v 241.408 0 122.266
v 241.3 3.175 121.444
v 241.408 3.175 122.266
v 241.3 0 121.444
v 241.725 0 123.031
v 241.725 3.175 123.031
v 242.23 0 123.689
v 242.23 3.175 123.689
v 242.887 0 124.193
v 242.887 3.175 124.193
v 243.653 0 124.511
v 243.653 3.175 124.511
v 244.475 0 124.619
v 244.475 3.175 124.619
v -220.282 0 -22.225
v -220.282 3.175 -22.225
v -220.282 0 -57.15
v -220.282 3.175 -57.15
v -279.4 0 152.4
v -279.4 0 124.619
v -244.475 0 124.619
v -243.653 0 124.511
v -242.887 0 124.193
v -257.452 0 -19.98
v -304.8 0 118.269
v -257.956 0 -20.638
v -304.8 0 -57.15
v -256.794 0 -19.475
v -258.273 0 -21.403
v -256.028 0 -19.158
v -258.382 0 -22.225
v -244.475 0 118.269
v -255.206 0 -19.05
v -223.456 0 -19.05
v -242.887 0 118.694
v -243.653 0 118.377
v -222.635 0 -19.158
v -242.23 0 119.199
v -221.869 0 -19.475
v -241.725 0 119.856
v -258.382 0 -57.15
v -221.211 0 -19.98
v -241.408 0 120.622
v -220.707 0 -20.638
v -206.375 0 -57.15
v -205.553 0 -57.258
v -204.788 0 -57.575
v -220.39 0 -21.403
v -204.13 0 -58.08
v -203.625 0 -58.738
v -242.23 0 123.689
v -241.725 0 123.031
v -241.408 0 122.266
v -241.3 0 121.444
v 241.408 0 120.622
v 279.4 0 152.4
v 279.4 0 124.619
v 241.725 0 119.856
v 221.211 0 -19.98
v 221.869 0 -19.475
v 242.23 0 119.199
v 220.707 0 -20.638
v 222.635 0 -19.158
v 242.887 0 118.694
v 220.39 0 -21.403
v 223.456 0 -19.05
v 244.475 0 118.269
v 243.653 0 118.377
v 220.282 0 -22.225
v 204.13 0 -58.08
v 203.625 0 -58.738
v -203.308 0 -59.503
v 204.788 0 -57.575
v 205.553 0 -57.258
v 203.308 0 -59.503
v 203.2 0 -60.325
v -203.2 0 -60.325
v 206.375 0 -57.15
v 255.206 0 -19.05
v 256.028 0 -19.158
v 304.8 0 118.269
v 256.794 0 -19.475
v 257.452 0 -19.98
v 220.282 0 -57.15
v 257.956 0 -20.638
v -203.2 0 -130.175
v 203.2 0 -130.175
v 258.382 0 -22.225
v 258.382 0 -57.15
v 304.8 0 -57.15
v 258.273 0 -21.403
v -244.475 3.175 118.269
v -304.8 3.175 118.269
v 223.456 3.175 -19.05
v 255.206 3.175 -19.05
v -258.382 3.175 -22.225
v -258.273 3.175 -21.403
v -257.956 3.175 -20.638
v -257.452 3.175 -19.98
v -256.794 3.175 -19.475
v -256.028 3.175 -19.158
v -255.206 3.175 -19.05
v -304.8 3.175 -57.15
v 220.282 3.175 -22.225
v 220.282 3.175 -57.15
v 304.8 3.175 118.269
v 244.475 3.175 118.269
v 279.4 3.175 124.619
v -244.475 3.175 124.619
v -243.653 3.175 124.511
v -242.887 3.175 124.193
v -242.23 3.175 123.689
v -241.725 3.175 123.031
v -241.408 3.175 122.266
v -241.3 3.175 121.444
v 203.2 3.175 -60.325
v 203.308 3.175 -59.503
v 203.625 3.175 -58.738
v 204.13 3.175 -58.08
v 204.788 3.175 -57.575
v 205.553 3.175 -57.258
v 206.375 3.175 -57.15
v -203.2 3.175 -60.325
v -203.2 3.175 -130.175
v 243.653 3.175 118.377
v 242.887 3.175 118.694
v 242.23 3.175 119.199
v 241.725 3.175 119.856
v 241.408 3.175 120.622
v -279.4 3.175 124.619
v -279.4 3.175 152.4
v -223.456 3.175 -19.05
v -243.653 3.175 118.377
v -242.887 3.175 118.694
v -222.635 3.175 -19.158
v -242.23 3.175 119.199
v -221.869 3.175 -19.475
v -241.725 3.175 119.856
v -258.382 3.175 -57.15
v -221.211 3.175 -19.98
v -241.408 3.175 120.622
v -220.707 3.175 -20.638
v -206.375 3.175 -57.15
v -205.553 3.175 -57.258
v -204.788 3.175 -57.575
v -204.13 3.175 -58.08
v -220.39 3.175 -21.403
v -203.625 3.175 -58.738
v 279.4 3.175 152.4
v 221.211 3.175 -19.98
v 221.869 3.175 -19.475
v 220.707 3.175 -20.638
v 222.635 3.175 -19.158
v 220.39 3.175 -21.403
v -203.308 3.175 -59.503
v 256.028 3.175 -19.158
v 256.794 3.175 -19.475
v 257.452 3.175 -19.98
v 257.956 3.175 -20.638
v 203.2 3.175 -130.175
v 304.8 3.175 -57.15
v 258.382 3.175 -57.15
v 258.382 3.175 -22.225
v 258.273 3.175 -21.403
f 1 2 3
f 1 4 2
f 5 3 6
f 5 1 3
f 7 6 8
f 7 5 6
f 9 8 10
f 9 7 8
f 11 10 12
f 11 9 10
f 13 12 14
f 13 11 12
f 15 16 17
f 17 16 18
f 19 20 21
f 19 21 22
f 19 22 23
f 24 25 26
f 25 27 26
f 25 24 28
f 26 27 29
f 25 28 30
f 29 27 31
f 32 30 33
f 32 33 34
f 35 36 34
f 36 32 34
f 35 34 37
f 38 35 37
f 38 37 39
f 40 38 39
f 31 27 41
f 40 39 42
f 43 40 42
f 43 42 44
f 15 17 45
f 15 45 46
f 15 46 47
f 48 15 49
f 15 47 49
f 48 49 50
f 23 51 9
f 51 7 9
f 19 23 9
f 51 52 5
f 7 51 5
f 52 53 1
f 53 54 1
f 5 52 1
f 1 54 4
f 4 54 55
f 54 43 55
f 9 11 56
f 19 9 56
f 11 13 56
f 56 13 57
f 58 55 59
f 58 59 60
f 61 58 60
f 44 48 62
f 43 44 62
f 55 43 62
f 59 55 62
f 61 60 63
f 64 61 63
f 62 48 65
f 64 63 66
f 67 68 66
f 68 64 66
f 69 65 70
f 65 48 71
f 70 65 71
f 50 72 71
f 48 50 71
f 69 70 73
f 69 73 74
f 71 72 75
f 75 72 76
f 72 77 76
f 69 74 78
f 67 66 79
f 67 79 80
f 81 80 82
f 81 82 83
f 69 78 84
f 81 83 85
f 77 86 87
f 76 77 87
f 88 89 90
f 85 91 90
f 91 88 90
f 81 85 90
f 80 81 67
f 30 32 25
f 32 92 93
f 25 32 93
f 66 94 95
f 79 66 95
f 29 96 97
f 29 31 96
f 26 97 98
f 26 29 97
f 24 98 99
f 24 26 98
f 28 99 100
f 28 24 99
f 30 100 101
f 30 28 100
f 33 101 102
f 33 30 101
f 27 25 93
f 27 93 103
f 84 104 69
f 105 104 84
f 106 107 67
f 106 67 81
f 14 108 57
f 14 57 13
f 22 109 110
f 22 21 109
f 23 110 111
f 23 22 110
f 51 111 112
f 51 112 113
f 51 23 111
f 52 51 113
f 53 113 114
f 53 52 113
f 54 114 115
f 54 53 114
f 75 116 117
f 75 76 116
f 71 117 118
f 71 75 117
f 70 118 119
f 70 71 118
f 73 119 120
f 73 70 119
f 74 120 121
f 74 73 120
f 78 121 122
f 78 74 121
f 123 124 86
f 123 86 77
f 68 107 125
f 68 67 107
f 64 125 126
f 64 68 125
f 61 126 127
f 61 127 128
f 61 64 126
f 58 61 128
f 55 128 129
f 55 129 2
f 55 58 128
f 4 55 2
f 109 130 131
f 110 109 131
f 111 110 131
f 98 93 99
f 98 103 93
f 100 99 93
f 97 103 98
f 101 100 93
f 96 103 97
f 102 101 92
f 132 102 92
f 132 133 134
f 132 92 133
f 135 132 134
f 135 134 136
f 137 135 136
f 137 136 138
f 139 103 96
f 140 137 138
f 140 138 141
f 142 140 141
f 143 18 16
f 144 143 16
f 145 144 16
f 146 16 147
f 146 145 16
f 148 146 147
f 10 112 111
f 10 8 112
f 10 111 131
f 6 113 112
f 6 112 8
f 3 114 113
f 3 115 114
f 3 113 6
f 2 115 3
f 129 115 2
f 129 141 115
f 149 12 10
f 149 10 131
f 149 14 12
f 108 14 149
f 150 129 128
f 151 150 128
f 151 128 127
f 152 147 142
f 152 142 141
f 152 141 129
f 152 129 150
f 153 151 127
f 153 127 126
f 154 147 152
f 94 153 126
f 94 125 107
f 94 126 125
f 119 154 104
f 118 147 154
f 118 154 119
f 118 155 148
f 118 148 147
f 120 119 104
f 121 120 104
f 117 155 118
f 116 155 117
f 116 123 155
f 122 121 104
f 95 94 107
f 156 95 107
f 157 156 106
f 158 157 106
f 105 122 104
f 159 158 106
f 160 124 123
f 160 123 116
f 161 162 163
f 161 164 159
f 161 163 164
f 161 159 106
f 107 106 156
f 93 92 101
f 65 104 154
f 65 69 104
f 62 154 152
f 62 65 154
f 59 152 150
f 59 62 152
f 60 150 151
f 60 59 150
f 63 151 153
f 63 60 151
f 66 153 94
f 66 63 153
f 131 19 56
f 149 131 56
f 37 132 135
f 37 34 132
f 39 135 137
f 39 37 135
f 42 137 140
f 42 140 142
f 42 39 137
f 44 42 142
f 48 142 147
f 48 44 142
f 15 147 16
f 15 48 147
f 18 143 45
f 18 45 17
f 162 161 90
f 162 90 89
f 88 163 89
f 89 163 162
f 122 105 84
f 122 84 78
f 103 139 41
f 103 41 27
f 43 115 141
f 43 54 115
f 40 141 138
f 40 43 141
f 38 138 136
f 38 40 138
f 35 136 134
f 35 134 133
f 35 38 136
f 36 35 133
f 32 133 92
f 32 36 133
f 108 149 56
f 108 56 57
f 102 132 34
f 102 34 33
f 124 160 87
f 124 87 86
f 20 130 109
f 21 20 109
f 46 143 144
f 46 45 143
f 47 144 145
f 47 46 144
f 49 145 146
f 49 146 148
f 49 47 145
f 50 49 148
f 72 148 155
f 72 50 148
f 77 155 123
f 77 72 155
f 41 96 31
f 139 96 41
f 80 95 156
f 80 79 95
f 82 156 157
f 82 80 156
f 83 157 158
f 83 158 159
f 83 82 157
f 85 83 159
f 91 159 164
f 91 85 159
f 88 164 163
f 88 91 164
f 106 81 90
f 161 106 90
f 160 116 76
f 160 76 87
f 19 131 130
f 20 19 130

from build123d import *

# Parameters (mm, degrees)
SKETCH1_W            = 609.6
SKETCH1_H            = 304.8
BOSS_EXTRUDE1_DEPTH  = 3.175
CUT_EXTRUDE1_REACH   = 342.792
FILLET1_R            = 3.175
CUT_EXTRUDE2_REACH   = 342.792
SKETCH4_W            = 38.1
SKETCH4_H            = 38.1
FILLET2_R            = 3.175
FILLET2_OF_MIRROR1_R = 3.175
CUT_EXTRUDE3_REACH   = 342.792
FILLET3_R            = 3.175
FILLET3_OF_MIRROR2_R = 3.175


with BuildPart() as part:
    # Sketch1 → Boss-Extrude1 (new body)
    with BuildSketch(Plane(origin=(0, 0, 0), x_dir=(1, 0, 0), z_dir=(0, 1, 0))):
        Rectangle(SKETCH1_W, SKETCH1_H)
    extrude(amount=BOSS_EXTRUDE1_DEPTH)

    # Sketch3 → Cut-Extrude1 (cut, up to next)
    with BuildSketch(Plane(origin=(0, 3.175, 0), x_dir=(1, 0, 0), z_dir=(0, 1, 0)), mode=Mode.PRIVATE) as cut_extrude1_sk1:
        Polygon((-304.8, 152.4), (304.8, 152.4), (304.8, 57.15), (203.2, 57.15), (203.2, 130.175), (-203.2, 130.175), (-203.2, 57.15), (-304.8, 57.15), align=None)
    cut_extrude1_tool1 = extrude(cut_extrude1_sk1.sketch, amount=-CUT_EXTRUDE1_REACH, mode=Mode.PRIVATE) & part.part
    add(cut_extrude1_tool1.solids().sort_by_distance((0, 3.175, -146.230035))[0], mode=Mode.SUBTRACT)

    # Fillet1
    fillet1_edges = [part.edges().sort_by_distance(p)[0] for p in [
        (203.2, 1.5875, -57.15),
        (-203.2, 1.5875, -57.15),
    ]]
    fillet(fillet1_edges, radius=FILLET1_R)

    # Sketch4 → Cut-Extrude2 (cut, up to next)
    with BuildSketch(Plane(origin=(0, 3.175, 0), x_dir=(1, 0, 0), z_dir=(0, 1, 0)), mode=Mode.PRIVATE) as cut_extrude2_sk1:
        with Locations((239.3315, 38.1)):
            Rectangle(SKETCH4_W, SKETCH4_H)
    cut_extrude2_tool1 = extrude(cut_extrude2_sk1.sketch, amount=-CUT_EXTRUDE2_REACH, mode=Mode.PRIVATE) & part.part
    cut_extrude2 = cut_extrude2_tool1.solids().sort_by_distance((239.3315, 3.175, -38.1))[0]
    add(cut_extrude2, mode=Mode.SUBTRACT)

    # Fillet2
    fillet2_edges = [part.edges().sort_by_distance(p)[0] for p in [
        (258.3815, 1.5875, -19.05),
        (220.2815, 1.5875, -19.05),
    ]]
    fillet(fillet2_edges, radius=FILLET2_R)

    # Mirror1: Cut-Extrude2 across plane
    add(cut_extrude2.mirror(Plane(origin=(0, 0, 0), x_dir=(0, 0, 1), z_dir=(1, 0, 0))), mode=Mode.SUBTRACT)

    # Fillet2 of Mirror1
    fillet2_of_mirror1_edges = [part.edges().sort_by_distance(p)[0] for p in [
        (-258.3815, 1.5875, -19.05),
        (-220.2815, 1.5875, -19.05),
    ]]
    fillet(fillet2_of_mirror1_edges, radius=FILLET2_OF_MIRROR1_R)

    # Sketch5 → Cut-Extrude3 (cut, up to next)
    with BuildSketch(Plane(origin=(0, 3.175, 0), x_dir=(1, 0, 0), z_dir=(0, 1, 0)), mode=Mode.PRIVATE) as cut_extrude3_sk1:
        Polygon((-279.4, -152.4), (-279.4, -124.61875), (-241.3, -124.61875), (-241.3, -118.26875), (-304.8, -118.26875), (-304.8, -152.4), align=None)
    cut_extrude3_tool1 = extrude(cut_extrude3_sk1.sketch, amount=-CUT_EXTRUDE3_REACH, mode=Mode.PRIVATE) & part.part
    cut_extrude3 = cut_extrude3_tool1.solids().sort_by_distance((-285.172727, 3.175, 132.303693))[0]
    add(cut_extrude3, mode=Mode.SUBTRACT)

    # Fillet3
    fillet3_edges = [part.edges().sort_by_distance(p)[0] for p in [
        (-241.3, 1.5875, 124.61875),
        (-241.3, 1.5875, 118.26875),
    ]]
    fillet(fillet3_edges, radius=FILLET3_R - 0.0001)  # a hair under: the kernel refuses the full size

    # Mirror2: Cut-Extrude3 across plane
    add(cut_extrude3.mirror(Plane(origin=(0, 0, 0), x_dir=(0, 0, 1), z_dir=(1, 0, 0))), mode=Mode.SUBTRACT)

    # Fillet3 of Mirror2
    fillet3_of_mirror2_edges = [part.edges().sort_by_distance(p)[0] for p in [
        (241.3, 1.5875, 124.61875),
        (241.3, 1.5875, 118.26875),
    ]]
    fillet(fillet3_of_mirror2_edges, radius=FILLET3_OF_MIRROR2_R - 0.0001)  # a hair under: the kernel refuses the full size


solid = part.part
